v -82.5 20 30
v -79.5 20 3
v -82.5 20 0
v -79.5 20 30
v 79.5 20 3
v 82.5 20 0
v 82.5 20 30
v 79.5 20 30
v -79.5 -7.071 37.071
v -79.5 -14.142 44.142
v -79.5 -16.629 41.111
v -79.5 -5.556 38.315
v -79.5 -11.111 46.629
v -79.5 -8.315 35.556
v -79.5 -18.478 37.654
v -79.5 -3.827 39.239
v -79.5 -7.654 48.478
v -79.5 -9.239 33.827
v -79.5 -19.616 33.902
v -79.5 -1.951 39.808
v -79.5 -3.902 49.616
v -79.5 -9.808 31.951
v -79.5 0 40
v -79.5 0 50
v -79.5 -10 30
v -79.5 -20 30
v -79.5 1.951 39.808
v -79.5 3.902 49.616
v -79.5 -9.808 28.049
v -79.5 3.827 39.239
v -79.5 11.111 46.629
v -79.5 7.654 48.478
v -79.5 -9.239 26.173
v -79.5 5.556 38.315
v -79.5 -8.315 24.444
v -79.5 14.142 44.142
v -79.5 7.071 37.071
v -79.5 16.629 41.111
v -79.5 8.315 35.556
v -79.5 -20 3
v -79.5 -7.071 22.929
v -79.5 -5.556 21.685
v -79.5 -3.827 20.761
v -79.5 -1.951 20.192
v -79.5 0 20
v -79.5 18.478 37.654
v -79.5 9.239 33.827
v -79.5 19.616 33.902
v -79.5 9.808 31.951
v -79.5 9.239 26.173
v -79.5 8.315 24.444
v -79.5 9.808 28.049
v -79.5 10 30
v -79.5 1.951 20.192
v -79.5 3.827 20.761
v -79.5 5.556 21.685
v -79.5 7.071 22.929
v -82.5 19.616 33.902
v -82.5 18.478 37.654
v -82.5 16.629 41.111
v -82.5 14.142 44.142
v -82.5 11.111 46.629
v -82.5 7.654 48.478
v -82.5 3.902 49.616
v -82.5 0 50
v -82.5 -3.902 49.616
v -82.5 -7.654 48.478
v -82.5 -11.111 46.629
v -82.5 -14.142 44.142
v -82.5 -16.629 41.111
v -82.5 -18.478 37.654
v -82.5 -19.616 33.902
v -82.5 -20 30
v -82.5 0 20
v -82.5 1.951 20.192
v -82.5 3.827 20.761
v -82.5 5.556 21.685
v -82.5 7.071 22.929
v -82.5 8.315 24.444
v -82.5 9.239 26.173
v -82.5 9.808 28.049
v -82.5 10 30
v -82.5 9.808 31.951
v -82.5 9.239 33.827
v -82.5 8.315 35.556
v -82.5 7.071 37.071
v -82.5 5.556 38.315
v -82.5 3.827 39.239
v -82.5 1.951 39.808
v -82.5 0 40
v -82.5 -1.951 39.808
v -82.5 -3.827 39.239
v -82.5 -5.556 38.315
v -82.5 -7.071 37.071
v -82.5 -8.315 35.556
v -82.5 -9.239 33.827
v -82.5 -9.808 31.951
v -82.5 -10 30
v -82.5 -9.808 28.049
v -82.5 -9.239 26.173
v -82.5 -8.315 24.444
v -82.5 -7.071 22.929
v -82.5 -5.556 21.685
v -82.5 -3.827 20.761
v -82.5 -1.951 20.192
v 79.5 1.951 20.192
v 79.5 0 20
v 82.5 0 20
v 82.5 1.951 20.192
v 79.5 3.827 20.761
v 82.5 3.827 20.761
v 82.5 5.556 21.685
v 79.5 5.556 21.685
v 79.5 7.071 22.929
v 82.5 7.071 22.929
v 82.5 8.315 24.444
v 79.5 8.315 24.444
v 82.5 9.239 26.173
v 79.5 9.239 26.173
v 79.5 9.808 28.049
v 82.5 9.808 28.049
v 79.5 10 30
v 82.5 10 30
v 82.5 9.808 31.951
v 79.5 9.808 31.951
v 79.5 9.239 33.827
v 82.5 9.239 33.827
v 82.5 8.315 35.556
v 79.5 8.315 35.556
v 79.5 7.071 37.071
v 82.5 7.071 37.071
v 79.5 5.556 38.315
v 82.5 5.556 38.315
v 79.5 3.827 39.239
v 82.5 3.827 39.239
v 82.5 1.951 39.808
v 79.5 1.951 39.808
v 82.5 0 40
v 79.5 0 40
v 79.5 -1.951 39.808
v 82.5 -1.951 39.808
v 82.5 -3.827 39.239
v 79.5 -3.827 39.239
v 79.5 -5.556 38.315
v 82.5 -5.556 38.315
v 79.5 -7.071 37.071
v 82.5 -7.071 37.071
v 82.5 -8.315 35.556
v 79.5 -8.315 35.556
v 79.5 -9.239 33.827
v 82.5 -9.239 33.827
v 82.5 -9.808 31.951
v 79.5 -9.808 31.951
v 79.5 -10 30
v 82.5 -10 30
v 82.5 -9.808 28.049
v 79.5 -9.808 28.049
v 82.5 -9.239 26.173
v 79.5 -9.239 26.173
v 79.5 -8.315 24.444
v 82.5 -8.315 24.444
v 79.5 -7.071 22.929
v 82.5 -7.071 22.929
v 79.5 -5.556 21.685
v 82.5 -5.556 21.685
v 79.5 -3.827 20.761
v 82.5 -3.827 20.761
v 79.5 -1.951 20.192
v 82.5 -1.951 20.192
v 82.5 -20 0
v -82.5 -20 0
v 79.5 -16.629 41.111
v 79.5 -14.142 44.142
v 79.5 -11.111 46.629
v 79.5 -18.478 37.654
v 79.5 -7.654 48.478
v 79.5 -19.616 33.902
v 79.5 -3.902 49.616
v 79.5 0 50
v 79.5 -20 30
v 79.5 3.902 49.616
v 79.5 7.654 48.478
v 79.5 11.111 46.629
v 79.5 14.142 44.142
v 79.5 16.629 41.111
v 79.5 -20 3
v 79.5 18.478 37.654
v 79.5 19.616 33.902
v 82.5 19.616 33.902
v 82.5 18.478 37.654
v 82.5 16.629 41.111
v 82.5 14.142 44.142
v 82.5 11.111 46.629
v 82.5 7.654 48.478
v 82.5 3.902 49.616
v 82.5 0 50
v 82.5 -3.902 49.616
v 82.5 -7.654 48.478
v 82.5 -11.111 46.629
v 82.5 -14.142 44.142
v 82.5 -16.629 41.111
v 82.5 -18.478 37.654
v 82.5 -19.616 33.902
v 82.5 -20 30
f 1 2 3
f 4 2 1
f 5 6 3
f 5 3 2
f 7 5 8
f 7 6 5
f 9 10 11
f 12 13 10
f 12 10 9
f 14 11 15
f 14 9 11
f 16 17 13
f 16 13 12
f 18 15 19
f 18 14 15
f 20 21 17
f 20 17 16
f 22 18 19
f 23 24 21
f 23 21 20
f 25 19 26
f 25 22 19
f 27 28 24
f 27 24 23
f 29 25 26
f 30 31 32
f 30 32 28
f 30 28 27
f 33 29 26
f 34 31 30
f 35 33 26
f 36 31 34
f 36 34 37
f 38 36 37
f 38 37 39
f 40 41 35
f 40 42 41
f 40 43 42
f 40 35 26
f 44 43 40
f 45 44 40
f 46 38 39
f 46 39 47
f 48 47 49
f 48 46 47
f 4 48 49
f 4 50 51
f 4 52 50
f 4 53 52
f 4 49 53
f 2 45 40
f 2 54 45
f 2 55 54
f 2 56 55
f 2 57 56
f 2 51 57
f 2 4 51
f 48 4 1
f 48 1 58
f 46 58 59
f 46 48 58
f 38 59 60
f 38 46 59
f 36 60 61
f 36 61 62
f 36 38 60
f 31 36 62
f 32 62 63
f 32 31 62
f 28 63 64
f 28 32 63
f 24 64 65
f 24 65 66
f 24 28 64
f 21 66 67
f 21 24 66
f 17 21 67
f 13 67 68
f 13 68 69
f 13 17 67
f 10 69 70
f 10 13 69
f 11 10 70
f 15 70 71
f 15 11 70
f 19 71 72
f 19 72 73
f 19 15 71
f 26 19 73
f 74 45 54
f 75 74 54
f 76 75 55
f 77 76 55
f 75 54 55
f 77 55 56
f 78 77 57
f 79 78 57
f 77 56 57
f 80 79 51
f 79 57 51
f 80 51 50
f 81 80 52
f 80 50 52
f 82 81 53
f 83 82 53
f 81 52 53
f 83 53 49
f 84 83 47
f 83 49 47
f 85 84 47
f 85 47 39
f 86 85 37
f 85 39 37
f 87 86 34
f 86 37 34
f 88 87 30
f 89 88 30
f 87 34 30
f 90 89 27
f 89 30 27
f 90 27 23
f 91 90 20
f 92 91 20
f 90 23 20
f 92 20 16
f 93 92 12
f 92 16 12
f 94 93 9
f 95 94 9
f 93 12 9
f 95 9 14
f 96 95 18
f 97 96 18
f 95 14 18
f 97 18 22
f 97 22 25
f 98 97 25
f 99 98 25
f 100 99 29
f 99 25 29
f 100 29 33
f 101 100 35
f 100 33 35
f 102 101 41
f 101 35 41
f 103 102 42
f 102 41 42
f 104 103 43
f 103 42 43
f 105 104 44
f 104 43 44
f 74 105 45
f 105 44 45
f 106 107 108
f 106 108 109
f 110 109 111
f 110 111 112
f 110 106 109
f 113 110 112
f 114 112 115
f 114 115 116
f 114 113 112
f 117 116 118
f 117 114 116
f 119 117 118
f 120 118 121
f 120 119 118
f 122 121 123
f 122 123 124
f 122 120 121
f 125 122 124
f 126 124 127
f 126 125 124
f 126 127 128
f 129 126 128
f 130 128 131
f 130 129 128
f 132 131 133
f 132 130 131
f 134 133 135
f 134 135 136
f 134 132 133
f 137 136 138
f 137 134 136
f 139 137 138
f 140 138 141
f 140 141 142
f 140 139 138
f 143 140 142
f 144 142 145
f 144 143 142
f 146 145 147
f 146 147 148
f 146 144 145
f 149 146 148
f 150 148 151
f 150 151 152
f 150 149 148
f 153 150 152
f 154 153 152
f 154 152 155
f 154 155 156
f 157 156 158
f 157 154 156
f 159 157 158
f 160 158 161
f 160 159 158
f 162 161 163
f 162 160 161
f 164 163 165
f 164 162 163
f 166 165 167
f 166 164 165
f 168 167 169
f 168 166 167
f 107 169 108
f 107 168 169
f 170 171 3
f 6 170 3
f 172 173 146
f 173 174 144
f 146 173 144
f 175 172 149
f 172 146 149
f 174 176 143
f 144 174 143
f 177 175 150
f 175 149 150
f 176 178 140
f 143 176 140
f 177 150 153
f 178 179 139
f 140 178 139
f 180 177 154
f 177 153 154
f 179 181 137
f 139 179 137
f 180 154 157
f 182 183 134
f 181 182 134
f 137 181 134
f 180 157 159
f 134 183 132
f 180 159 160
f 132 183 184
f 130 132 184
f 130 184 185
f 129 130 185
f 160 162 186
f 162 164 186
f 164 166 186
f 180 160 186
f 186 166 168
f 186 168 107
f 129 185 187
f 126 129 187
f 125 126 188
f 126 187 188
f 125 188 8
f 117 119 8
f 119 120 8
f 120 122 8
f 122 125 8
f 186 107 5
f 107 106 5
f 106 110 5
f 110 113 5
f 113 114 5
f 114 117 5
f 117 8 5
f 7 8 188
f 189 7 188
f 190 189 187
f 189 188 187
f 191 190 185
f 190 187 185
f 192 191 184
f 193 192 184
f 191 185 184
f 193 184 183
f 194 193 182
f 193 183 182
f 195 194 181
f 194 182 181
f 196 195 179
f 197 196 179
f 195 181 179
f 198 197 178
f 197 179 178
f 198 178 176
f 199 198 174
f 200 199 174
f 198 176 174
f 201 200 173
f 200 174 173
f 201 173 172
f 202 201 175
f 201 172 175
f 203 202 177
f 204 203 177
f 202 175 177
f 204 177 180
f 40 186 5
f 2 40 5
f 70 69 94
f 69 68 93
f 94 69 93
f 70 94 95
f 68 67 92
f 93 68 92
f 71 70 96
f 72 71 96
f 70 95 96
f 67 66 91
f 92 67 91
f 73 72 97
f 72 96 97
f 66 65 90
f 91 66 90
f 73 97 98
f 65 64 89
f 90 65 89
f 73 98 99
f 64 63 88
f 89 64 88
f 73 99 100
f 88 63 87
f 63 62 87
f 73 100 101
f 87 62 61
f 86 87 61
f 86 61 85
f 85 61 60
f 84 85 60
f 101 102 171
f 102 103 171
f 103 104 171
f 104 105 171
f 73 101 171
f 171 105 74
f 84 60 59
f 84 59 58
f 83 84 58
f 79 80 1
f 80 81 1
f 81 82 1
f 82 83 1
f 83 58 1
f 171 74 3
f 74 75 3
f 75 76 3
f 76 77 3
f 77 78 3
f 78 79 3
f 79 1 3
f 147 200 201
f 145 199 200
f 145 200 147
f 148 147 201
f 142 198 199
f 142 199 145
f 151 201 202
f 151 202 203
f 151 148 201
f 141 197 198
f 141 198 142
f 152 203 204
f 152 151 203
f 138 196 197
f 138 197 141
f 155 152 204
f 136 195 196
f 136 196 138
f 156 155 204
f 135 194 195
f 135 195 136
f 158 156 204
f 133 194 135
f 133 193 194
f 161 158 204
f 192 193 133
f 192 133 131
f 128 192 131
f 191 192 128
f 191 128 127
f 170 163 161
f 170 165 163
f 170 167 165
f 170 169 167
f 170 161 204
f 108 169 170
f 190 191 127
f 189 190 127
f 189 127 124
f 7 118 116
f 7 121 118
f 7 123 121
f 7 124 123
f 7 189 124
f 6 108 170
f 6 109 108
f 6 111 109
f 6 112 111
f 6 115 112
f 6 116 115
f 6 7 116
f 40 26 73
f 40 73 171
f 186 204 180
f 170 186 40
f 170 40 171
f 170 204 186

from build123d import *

# Parameters (mm, degrees)
SKETCH_1_W      = 3
SKETCH_1_H      = 40
EXTRUDE_1_DEPTH = 79.5
SKETCH_2_R      = 10
EXTRUDE_2_DEPTH = 3


with BuildPart() as part:
    # 스케치1 → 보스-돌출1 (new, symmetric)
    with BuildSketch(Plane(origin=(0, 0, 0), x_dir=(0, 0, -1), z_dir=(1, 0, 0))):
        with Locations((-1.5, 0)):
            Rectangle(SKETCH_1_W, SKETCH_1_H)
    extrude(amount=EXTRUDE_1_DEPTH, both=True)

    # 스케치2 → 보스-돌출2 (add)
    with BuildSketch(Plane(origin=(79.5, 0, 0), x_dir=(0, 0, -1), z_dir=(1, 0, 0))):
        with BuildLine():
            Line((0, 20), (-30, 20))
            ThreePointArc((-30, 20), (-50, 0), (-30, -20))
            Line((-30, -20), (0, -20))
            Line((0, -20), (0, 20))
        make_face()
        with Locations((-30, 0)):
            Circle(SKETCH_2_R, mode=Mode.SUBTRACT)
    extrude_2 = extrude(amount=EXTRUDE_2_DEPTH)

    # 대칭 복사1: 보스-돌출2 across plane
    add(extrude_2.mirror(Plane(origin=(0, 0, 0), x_dir=(0, 0, 1), z_dir=(1, 0, 0))))


solid = part.part
